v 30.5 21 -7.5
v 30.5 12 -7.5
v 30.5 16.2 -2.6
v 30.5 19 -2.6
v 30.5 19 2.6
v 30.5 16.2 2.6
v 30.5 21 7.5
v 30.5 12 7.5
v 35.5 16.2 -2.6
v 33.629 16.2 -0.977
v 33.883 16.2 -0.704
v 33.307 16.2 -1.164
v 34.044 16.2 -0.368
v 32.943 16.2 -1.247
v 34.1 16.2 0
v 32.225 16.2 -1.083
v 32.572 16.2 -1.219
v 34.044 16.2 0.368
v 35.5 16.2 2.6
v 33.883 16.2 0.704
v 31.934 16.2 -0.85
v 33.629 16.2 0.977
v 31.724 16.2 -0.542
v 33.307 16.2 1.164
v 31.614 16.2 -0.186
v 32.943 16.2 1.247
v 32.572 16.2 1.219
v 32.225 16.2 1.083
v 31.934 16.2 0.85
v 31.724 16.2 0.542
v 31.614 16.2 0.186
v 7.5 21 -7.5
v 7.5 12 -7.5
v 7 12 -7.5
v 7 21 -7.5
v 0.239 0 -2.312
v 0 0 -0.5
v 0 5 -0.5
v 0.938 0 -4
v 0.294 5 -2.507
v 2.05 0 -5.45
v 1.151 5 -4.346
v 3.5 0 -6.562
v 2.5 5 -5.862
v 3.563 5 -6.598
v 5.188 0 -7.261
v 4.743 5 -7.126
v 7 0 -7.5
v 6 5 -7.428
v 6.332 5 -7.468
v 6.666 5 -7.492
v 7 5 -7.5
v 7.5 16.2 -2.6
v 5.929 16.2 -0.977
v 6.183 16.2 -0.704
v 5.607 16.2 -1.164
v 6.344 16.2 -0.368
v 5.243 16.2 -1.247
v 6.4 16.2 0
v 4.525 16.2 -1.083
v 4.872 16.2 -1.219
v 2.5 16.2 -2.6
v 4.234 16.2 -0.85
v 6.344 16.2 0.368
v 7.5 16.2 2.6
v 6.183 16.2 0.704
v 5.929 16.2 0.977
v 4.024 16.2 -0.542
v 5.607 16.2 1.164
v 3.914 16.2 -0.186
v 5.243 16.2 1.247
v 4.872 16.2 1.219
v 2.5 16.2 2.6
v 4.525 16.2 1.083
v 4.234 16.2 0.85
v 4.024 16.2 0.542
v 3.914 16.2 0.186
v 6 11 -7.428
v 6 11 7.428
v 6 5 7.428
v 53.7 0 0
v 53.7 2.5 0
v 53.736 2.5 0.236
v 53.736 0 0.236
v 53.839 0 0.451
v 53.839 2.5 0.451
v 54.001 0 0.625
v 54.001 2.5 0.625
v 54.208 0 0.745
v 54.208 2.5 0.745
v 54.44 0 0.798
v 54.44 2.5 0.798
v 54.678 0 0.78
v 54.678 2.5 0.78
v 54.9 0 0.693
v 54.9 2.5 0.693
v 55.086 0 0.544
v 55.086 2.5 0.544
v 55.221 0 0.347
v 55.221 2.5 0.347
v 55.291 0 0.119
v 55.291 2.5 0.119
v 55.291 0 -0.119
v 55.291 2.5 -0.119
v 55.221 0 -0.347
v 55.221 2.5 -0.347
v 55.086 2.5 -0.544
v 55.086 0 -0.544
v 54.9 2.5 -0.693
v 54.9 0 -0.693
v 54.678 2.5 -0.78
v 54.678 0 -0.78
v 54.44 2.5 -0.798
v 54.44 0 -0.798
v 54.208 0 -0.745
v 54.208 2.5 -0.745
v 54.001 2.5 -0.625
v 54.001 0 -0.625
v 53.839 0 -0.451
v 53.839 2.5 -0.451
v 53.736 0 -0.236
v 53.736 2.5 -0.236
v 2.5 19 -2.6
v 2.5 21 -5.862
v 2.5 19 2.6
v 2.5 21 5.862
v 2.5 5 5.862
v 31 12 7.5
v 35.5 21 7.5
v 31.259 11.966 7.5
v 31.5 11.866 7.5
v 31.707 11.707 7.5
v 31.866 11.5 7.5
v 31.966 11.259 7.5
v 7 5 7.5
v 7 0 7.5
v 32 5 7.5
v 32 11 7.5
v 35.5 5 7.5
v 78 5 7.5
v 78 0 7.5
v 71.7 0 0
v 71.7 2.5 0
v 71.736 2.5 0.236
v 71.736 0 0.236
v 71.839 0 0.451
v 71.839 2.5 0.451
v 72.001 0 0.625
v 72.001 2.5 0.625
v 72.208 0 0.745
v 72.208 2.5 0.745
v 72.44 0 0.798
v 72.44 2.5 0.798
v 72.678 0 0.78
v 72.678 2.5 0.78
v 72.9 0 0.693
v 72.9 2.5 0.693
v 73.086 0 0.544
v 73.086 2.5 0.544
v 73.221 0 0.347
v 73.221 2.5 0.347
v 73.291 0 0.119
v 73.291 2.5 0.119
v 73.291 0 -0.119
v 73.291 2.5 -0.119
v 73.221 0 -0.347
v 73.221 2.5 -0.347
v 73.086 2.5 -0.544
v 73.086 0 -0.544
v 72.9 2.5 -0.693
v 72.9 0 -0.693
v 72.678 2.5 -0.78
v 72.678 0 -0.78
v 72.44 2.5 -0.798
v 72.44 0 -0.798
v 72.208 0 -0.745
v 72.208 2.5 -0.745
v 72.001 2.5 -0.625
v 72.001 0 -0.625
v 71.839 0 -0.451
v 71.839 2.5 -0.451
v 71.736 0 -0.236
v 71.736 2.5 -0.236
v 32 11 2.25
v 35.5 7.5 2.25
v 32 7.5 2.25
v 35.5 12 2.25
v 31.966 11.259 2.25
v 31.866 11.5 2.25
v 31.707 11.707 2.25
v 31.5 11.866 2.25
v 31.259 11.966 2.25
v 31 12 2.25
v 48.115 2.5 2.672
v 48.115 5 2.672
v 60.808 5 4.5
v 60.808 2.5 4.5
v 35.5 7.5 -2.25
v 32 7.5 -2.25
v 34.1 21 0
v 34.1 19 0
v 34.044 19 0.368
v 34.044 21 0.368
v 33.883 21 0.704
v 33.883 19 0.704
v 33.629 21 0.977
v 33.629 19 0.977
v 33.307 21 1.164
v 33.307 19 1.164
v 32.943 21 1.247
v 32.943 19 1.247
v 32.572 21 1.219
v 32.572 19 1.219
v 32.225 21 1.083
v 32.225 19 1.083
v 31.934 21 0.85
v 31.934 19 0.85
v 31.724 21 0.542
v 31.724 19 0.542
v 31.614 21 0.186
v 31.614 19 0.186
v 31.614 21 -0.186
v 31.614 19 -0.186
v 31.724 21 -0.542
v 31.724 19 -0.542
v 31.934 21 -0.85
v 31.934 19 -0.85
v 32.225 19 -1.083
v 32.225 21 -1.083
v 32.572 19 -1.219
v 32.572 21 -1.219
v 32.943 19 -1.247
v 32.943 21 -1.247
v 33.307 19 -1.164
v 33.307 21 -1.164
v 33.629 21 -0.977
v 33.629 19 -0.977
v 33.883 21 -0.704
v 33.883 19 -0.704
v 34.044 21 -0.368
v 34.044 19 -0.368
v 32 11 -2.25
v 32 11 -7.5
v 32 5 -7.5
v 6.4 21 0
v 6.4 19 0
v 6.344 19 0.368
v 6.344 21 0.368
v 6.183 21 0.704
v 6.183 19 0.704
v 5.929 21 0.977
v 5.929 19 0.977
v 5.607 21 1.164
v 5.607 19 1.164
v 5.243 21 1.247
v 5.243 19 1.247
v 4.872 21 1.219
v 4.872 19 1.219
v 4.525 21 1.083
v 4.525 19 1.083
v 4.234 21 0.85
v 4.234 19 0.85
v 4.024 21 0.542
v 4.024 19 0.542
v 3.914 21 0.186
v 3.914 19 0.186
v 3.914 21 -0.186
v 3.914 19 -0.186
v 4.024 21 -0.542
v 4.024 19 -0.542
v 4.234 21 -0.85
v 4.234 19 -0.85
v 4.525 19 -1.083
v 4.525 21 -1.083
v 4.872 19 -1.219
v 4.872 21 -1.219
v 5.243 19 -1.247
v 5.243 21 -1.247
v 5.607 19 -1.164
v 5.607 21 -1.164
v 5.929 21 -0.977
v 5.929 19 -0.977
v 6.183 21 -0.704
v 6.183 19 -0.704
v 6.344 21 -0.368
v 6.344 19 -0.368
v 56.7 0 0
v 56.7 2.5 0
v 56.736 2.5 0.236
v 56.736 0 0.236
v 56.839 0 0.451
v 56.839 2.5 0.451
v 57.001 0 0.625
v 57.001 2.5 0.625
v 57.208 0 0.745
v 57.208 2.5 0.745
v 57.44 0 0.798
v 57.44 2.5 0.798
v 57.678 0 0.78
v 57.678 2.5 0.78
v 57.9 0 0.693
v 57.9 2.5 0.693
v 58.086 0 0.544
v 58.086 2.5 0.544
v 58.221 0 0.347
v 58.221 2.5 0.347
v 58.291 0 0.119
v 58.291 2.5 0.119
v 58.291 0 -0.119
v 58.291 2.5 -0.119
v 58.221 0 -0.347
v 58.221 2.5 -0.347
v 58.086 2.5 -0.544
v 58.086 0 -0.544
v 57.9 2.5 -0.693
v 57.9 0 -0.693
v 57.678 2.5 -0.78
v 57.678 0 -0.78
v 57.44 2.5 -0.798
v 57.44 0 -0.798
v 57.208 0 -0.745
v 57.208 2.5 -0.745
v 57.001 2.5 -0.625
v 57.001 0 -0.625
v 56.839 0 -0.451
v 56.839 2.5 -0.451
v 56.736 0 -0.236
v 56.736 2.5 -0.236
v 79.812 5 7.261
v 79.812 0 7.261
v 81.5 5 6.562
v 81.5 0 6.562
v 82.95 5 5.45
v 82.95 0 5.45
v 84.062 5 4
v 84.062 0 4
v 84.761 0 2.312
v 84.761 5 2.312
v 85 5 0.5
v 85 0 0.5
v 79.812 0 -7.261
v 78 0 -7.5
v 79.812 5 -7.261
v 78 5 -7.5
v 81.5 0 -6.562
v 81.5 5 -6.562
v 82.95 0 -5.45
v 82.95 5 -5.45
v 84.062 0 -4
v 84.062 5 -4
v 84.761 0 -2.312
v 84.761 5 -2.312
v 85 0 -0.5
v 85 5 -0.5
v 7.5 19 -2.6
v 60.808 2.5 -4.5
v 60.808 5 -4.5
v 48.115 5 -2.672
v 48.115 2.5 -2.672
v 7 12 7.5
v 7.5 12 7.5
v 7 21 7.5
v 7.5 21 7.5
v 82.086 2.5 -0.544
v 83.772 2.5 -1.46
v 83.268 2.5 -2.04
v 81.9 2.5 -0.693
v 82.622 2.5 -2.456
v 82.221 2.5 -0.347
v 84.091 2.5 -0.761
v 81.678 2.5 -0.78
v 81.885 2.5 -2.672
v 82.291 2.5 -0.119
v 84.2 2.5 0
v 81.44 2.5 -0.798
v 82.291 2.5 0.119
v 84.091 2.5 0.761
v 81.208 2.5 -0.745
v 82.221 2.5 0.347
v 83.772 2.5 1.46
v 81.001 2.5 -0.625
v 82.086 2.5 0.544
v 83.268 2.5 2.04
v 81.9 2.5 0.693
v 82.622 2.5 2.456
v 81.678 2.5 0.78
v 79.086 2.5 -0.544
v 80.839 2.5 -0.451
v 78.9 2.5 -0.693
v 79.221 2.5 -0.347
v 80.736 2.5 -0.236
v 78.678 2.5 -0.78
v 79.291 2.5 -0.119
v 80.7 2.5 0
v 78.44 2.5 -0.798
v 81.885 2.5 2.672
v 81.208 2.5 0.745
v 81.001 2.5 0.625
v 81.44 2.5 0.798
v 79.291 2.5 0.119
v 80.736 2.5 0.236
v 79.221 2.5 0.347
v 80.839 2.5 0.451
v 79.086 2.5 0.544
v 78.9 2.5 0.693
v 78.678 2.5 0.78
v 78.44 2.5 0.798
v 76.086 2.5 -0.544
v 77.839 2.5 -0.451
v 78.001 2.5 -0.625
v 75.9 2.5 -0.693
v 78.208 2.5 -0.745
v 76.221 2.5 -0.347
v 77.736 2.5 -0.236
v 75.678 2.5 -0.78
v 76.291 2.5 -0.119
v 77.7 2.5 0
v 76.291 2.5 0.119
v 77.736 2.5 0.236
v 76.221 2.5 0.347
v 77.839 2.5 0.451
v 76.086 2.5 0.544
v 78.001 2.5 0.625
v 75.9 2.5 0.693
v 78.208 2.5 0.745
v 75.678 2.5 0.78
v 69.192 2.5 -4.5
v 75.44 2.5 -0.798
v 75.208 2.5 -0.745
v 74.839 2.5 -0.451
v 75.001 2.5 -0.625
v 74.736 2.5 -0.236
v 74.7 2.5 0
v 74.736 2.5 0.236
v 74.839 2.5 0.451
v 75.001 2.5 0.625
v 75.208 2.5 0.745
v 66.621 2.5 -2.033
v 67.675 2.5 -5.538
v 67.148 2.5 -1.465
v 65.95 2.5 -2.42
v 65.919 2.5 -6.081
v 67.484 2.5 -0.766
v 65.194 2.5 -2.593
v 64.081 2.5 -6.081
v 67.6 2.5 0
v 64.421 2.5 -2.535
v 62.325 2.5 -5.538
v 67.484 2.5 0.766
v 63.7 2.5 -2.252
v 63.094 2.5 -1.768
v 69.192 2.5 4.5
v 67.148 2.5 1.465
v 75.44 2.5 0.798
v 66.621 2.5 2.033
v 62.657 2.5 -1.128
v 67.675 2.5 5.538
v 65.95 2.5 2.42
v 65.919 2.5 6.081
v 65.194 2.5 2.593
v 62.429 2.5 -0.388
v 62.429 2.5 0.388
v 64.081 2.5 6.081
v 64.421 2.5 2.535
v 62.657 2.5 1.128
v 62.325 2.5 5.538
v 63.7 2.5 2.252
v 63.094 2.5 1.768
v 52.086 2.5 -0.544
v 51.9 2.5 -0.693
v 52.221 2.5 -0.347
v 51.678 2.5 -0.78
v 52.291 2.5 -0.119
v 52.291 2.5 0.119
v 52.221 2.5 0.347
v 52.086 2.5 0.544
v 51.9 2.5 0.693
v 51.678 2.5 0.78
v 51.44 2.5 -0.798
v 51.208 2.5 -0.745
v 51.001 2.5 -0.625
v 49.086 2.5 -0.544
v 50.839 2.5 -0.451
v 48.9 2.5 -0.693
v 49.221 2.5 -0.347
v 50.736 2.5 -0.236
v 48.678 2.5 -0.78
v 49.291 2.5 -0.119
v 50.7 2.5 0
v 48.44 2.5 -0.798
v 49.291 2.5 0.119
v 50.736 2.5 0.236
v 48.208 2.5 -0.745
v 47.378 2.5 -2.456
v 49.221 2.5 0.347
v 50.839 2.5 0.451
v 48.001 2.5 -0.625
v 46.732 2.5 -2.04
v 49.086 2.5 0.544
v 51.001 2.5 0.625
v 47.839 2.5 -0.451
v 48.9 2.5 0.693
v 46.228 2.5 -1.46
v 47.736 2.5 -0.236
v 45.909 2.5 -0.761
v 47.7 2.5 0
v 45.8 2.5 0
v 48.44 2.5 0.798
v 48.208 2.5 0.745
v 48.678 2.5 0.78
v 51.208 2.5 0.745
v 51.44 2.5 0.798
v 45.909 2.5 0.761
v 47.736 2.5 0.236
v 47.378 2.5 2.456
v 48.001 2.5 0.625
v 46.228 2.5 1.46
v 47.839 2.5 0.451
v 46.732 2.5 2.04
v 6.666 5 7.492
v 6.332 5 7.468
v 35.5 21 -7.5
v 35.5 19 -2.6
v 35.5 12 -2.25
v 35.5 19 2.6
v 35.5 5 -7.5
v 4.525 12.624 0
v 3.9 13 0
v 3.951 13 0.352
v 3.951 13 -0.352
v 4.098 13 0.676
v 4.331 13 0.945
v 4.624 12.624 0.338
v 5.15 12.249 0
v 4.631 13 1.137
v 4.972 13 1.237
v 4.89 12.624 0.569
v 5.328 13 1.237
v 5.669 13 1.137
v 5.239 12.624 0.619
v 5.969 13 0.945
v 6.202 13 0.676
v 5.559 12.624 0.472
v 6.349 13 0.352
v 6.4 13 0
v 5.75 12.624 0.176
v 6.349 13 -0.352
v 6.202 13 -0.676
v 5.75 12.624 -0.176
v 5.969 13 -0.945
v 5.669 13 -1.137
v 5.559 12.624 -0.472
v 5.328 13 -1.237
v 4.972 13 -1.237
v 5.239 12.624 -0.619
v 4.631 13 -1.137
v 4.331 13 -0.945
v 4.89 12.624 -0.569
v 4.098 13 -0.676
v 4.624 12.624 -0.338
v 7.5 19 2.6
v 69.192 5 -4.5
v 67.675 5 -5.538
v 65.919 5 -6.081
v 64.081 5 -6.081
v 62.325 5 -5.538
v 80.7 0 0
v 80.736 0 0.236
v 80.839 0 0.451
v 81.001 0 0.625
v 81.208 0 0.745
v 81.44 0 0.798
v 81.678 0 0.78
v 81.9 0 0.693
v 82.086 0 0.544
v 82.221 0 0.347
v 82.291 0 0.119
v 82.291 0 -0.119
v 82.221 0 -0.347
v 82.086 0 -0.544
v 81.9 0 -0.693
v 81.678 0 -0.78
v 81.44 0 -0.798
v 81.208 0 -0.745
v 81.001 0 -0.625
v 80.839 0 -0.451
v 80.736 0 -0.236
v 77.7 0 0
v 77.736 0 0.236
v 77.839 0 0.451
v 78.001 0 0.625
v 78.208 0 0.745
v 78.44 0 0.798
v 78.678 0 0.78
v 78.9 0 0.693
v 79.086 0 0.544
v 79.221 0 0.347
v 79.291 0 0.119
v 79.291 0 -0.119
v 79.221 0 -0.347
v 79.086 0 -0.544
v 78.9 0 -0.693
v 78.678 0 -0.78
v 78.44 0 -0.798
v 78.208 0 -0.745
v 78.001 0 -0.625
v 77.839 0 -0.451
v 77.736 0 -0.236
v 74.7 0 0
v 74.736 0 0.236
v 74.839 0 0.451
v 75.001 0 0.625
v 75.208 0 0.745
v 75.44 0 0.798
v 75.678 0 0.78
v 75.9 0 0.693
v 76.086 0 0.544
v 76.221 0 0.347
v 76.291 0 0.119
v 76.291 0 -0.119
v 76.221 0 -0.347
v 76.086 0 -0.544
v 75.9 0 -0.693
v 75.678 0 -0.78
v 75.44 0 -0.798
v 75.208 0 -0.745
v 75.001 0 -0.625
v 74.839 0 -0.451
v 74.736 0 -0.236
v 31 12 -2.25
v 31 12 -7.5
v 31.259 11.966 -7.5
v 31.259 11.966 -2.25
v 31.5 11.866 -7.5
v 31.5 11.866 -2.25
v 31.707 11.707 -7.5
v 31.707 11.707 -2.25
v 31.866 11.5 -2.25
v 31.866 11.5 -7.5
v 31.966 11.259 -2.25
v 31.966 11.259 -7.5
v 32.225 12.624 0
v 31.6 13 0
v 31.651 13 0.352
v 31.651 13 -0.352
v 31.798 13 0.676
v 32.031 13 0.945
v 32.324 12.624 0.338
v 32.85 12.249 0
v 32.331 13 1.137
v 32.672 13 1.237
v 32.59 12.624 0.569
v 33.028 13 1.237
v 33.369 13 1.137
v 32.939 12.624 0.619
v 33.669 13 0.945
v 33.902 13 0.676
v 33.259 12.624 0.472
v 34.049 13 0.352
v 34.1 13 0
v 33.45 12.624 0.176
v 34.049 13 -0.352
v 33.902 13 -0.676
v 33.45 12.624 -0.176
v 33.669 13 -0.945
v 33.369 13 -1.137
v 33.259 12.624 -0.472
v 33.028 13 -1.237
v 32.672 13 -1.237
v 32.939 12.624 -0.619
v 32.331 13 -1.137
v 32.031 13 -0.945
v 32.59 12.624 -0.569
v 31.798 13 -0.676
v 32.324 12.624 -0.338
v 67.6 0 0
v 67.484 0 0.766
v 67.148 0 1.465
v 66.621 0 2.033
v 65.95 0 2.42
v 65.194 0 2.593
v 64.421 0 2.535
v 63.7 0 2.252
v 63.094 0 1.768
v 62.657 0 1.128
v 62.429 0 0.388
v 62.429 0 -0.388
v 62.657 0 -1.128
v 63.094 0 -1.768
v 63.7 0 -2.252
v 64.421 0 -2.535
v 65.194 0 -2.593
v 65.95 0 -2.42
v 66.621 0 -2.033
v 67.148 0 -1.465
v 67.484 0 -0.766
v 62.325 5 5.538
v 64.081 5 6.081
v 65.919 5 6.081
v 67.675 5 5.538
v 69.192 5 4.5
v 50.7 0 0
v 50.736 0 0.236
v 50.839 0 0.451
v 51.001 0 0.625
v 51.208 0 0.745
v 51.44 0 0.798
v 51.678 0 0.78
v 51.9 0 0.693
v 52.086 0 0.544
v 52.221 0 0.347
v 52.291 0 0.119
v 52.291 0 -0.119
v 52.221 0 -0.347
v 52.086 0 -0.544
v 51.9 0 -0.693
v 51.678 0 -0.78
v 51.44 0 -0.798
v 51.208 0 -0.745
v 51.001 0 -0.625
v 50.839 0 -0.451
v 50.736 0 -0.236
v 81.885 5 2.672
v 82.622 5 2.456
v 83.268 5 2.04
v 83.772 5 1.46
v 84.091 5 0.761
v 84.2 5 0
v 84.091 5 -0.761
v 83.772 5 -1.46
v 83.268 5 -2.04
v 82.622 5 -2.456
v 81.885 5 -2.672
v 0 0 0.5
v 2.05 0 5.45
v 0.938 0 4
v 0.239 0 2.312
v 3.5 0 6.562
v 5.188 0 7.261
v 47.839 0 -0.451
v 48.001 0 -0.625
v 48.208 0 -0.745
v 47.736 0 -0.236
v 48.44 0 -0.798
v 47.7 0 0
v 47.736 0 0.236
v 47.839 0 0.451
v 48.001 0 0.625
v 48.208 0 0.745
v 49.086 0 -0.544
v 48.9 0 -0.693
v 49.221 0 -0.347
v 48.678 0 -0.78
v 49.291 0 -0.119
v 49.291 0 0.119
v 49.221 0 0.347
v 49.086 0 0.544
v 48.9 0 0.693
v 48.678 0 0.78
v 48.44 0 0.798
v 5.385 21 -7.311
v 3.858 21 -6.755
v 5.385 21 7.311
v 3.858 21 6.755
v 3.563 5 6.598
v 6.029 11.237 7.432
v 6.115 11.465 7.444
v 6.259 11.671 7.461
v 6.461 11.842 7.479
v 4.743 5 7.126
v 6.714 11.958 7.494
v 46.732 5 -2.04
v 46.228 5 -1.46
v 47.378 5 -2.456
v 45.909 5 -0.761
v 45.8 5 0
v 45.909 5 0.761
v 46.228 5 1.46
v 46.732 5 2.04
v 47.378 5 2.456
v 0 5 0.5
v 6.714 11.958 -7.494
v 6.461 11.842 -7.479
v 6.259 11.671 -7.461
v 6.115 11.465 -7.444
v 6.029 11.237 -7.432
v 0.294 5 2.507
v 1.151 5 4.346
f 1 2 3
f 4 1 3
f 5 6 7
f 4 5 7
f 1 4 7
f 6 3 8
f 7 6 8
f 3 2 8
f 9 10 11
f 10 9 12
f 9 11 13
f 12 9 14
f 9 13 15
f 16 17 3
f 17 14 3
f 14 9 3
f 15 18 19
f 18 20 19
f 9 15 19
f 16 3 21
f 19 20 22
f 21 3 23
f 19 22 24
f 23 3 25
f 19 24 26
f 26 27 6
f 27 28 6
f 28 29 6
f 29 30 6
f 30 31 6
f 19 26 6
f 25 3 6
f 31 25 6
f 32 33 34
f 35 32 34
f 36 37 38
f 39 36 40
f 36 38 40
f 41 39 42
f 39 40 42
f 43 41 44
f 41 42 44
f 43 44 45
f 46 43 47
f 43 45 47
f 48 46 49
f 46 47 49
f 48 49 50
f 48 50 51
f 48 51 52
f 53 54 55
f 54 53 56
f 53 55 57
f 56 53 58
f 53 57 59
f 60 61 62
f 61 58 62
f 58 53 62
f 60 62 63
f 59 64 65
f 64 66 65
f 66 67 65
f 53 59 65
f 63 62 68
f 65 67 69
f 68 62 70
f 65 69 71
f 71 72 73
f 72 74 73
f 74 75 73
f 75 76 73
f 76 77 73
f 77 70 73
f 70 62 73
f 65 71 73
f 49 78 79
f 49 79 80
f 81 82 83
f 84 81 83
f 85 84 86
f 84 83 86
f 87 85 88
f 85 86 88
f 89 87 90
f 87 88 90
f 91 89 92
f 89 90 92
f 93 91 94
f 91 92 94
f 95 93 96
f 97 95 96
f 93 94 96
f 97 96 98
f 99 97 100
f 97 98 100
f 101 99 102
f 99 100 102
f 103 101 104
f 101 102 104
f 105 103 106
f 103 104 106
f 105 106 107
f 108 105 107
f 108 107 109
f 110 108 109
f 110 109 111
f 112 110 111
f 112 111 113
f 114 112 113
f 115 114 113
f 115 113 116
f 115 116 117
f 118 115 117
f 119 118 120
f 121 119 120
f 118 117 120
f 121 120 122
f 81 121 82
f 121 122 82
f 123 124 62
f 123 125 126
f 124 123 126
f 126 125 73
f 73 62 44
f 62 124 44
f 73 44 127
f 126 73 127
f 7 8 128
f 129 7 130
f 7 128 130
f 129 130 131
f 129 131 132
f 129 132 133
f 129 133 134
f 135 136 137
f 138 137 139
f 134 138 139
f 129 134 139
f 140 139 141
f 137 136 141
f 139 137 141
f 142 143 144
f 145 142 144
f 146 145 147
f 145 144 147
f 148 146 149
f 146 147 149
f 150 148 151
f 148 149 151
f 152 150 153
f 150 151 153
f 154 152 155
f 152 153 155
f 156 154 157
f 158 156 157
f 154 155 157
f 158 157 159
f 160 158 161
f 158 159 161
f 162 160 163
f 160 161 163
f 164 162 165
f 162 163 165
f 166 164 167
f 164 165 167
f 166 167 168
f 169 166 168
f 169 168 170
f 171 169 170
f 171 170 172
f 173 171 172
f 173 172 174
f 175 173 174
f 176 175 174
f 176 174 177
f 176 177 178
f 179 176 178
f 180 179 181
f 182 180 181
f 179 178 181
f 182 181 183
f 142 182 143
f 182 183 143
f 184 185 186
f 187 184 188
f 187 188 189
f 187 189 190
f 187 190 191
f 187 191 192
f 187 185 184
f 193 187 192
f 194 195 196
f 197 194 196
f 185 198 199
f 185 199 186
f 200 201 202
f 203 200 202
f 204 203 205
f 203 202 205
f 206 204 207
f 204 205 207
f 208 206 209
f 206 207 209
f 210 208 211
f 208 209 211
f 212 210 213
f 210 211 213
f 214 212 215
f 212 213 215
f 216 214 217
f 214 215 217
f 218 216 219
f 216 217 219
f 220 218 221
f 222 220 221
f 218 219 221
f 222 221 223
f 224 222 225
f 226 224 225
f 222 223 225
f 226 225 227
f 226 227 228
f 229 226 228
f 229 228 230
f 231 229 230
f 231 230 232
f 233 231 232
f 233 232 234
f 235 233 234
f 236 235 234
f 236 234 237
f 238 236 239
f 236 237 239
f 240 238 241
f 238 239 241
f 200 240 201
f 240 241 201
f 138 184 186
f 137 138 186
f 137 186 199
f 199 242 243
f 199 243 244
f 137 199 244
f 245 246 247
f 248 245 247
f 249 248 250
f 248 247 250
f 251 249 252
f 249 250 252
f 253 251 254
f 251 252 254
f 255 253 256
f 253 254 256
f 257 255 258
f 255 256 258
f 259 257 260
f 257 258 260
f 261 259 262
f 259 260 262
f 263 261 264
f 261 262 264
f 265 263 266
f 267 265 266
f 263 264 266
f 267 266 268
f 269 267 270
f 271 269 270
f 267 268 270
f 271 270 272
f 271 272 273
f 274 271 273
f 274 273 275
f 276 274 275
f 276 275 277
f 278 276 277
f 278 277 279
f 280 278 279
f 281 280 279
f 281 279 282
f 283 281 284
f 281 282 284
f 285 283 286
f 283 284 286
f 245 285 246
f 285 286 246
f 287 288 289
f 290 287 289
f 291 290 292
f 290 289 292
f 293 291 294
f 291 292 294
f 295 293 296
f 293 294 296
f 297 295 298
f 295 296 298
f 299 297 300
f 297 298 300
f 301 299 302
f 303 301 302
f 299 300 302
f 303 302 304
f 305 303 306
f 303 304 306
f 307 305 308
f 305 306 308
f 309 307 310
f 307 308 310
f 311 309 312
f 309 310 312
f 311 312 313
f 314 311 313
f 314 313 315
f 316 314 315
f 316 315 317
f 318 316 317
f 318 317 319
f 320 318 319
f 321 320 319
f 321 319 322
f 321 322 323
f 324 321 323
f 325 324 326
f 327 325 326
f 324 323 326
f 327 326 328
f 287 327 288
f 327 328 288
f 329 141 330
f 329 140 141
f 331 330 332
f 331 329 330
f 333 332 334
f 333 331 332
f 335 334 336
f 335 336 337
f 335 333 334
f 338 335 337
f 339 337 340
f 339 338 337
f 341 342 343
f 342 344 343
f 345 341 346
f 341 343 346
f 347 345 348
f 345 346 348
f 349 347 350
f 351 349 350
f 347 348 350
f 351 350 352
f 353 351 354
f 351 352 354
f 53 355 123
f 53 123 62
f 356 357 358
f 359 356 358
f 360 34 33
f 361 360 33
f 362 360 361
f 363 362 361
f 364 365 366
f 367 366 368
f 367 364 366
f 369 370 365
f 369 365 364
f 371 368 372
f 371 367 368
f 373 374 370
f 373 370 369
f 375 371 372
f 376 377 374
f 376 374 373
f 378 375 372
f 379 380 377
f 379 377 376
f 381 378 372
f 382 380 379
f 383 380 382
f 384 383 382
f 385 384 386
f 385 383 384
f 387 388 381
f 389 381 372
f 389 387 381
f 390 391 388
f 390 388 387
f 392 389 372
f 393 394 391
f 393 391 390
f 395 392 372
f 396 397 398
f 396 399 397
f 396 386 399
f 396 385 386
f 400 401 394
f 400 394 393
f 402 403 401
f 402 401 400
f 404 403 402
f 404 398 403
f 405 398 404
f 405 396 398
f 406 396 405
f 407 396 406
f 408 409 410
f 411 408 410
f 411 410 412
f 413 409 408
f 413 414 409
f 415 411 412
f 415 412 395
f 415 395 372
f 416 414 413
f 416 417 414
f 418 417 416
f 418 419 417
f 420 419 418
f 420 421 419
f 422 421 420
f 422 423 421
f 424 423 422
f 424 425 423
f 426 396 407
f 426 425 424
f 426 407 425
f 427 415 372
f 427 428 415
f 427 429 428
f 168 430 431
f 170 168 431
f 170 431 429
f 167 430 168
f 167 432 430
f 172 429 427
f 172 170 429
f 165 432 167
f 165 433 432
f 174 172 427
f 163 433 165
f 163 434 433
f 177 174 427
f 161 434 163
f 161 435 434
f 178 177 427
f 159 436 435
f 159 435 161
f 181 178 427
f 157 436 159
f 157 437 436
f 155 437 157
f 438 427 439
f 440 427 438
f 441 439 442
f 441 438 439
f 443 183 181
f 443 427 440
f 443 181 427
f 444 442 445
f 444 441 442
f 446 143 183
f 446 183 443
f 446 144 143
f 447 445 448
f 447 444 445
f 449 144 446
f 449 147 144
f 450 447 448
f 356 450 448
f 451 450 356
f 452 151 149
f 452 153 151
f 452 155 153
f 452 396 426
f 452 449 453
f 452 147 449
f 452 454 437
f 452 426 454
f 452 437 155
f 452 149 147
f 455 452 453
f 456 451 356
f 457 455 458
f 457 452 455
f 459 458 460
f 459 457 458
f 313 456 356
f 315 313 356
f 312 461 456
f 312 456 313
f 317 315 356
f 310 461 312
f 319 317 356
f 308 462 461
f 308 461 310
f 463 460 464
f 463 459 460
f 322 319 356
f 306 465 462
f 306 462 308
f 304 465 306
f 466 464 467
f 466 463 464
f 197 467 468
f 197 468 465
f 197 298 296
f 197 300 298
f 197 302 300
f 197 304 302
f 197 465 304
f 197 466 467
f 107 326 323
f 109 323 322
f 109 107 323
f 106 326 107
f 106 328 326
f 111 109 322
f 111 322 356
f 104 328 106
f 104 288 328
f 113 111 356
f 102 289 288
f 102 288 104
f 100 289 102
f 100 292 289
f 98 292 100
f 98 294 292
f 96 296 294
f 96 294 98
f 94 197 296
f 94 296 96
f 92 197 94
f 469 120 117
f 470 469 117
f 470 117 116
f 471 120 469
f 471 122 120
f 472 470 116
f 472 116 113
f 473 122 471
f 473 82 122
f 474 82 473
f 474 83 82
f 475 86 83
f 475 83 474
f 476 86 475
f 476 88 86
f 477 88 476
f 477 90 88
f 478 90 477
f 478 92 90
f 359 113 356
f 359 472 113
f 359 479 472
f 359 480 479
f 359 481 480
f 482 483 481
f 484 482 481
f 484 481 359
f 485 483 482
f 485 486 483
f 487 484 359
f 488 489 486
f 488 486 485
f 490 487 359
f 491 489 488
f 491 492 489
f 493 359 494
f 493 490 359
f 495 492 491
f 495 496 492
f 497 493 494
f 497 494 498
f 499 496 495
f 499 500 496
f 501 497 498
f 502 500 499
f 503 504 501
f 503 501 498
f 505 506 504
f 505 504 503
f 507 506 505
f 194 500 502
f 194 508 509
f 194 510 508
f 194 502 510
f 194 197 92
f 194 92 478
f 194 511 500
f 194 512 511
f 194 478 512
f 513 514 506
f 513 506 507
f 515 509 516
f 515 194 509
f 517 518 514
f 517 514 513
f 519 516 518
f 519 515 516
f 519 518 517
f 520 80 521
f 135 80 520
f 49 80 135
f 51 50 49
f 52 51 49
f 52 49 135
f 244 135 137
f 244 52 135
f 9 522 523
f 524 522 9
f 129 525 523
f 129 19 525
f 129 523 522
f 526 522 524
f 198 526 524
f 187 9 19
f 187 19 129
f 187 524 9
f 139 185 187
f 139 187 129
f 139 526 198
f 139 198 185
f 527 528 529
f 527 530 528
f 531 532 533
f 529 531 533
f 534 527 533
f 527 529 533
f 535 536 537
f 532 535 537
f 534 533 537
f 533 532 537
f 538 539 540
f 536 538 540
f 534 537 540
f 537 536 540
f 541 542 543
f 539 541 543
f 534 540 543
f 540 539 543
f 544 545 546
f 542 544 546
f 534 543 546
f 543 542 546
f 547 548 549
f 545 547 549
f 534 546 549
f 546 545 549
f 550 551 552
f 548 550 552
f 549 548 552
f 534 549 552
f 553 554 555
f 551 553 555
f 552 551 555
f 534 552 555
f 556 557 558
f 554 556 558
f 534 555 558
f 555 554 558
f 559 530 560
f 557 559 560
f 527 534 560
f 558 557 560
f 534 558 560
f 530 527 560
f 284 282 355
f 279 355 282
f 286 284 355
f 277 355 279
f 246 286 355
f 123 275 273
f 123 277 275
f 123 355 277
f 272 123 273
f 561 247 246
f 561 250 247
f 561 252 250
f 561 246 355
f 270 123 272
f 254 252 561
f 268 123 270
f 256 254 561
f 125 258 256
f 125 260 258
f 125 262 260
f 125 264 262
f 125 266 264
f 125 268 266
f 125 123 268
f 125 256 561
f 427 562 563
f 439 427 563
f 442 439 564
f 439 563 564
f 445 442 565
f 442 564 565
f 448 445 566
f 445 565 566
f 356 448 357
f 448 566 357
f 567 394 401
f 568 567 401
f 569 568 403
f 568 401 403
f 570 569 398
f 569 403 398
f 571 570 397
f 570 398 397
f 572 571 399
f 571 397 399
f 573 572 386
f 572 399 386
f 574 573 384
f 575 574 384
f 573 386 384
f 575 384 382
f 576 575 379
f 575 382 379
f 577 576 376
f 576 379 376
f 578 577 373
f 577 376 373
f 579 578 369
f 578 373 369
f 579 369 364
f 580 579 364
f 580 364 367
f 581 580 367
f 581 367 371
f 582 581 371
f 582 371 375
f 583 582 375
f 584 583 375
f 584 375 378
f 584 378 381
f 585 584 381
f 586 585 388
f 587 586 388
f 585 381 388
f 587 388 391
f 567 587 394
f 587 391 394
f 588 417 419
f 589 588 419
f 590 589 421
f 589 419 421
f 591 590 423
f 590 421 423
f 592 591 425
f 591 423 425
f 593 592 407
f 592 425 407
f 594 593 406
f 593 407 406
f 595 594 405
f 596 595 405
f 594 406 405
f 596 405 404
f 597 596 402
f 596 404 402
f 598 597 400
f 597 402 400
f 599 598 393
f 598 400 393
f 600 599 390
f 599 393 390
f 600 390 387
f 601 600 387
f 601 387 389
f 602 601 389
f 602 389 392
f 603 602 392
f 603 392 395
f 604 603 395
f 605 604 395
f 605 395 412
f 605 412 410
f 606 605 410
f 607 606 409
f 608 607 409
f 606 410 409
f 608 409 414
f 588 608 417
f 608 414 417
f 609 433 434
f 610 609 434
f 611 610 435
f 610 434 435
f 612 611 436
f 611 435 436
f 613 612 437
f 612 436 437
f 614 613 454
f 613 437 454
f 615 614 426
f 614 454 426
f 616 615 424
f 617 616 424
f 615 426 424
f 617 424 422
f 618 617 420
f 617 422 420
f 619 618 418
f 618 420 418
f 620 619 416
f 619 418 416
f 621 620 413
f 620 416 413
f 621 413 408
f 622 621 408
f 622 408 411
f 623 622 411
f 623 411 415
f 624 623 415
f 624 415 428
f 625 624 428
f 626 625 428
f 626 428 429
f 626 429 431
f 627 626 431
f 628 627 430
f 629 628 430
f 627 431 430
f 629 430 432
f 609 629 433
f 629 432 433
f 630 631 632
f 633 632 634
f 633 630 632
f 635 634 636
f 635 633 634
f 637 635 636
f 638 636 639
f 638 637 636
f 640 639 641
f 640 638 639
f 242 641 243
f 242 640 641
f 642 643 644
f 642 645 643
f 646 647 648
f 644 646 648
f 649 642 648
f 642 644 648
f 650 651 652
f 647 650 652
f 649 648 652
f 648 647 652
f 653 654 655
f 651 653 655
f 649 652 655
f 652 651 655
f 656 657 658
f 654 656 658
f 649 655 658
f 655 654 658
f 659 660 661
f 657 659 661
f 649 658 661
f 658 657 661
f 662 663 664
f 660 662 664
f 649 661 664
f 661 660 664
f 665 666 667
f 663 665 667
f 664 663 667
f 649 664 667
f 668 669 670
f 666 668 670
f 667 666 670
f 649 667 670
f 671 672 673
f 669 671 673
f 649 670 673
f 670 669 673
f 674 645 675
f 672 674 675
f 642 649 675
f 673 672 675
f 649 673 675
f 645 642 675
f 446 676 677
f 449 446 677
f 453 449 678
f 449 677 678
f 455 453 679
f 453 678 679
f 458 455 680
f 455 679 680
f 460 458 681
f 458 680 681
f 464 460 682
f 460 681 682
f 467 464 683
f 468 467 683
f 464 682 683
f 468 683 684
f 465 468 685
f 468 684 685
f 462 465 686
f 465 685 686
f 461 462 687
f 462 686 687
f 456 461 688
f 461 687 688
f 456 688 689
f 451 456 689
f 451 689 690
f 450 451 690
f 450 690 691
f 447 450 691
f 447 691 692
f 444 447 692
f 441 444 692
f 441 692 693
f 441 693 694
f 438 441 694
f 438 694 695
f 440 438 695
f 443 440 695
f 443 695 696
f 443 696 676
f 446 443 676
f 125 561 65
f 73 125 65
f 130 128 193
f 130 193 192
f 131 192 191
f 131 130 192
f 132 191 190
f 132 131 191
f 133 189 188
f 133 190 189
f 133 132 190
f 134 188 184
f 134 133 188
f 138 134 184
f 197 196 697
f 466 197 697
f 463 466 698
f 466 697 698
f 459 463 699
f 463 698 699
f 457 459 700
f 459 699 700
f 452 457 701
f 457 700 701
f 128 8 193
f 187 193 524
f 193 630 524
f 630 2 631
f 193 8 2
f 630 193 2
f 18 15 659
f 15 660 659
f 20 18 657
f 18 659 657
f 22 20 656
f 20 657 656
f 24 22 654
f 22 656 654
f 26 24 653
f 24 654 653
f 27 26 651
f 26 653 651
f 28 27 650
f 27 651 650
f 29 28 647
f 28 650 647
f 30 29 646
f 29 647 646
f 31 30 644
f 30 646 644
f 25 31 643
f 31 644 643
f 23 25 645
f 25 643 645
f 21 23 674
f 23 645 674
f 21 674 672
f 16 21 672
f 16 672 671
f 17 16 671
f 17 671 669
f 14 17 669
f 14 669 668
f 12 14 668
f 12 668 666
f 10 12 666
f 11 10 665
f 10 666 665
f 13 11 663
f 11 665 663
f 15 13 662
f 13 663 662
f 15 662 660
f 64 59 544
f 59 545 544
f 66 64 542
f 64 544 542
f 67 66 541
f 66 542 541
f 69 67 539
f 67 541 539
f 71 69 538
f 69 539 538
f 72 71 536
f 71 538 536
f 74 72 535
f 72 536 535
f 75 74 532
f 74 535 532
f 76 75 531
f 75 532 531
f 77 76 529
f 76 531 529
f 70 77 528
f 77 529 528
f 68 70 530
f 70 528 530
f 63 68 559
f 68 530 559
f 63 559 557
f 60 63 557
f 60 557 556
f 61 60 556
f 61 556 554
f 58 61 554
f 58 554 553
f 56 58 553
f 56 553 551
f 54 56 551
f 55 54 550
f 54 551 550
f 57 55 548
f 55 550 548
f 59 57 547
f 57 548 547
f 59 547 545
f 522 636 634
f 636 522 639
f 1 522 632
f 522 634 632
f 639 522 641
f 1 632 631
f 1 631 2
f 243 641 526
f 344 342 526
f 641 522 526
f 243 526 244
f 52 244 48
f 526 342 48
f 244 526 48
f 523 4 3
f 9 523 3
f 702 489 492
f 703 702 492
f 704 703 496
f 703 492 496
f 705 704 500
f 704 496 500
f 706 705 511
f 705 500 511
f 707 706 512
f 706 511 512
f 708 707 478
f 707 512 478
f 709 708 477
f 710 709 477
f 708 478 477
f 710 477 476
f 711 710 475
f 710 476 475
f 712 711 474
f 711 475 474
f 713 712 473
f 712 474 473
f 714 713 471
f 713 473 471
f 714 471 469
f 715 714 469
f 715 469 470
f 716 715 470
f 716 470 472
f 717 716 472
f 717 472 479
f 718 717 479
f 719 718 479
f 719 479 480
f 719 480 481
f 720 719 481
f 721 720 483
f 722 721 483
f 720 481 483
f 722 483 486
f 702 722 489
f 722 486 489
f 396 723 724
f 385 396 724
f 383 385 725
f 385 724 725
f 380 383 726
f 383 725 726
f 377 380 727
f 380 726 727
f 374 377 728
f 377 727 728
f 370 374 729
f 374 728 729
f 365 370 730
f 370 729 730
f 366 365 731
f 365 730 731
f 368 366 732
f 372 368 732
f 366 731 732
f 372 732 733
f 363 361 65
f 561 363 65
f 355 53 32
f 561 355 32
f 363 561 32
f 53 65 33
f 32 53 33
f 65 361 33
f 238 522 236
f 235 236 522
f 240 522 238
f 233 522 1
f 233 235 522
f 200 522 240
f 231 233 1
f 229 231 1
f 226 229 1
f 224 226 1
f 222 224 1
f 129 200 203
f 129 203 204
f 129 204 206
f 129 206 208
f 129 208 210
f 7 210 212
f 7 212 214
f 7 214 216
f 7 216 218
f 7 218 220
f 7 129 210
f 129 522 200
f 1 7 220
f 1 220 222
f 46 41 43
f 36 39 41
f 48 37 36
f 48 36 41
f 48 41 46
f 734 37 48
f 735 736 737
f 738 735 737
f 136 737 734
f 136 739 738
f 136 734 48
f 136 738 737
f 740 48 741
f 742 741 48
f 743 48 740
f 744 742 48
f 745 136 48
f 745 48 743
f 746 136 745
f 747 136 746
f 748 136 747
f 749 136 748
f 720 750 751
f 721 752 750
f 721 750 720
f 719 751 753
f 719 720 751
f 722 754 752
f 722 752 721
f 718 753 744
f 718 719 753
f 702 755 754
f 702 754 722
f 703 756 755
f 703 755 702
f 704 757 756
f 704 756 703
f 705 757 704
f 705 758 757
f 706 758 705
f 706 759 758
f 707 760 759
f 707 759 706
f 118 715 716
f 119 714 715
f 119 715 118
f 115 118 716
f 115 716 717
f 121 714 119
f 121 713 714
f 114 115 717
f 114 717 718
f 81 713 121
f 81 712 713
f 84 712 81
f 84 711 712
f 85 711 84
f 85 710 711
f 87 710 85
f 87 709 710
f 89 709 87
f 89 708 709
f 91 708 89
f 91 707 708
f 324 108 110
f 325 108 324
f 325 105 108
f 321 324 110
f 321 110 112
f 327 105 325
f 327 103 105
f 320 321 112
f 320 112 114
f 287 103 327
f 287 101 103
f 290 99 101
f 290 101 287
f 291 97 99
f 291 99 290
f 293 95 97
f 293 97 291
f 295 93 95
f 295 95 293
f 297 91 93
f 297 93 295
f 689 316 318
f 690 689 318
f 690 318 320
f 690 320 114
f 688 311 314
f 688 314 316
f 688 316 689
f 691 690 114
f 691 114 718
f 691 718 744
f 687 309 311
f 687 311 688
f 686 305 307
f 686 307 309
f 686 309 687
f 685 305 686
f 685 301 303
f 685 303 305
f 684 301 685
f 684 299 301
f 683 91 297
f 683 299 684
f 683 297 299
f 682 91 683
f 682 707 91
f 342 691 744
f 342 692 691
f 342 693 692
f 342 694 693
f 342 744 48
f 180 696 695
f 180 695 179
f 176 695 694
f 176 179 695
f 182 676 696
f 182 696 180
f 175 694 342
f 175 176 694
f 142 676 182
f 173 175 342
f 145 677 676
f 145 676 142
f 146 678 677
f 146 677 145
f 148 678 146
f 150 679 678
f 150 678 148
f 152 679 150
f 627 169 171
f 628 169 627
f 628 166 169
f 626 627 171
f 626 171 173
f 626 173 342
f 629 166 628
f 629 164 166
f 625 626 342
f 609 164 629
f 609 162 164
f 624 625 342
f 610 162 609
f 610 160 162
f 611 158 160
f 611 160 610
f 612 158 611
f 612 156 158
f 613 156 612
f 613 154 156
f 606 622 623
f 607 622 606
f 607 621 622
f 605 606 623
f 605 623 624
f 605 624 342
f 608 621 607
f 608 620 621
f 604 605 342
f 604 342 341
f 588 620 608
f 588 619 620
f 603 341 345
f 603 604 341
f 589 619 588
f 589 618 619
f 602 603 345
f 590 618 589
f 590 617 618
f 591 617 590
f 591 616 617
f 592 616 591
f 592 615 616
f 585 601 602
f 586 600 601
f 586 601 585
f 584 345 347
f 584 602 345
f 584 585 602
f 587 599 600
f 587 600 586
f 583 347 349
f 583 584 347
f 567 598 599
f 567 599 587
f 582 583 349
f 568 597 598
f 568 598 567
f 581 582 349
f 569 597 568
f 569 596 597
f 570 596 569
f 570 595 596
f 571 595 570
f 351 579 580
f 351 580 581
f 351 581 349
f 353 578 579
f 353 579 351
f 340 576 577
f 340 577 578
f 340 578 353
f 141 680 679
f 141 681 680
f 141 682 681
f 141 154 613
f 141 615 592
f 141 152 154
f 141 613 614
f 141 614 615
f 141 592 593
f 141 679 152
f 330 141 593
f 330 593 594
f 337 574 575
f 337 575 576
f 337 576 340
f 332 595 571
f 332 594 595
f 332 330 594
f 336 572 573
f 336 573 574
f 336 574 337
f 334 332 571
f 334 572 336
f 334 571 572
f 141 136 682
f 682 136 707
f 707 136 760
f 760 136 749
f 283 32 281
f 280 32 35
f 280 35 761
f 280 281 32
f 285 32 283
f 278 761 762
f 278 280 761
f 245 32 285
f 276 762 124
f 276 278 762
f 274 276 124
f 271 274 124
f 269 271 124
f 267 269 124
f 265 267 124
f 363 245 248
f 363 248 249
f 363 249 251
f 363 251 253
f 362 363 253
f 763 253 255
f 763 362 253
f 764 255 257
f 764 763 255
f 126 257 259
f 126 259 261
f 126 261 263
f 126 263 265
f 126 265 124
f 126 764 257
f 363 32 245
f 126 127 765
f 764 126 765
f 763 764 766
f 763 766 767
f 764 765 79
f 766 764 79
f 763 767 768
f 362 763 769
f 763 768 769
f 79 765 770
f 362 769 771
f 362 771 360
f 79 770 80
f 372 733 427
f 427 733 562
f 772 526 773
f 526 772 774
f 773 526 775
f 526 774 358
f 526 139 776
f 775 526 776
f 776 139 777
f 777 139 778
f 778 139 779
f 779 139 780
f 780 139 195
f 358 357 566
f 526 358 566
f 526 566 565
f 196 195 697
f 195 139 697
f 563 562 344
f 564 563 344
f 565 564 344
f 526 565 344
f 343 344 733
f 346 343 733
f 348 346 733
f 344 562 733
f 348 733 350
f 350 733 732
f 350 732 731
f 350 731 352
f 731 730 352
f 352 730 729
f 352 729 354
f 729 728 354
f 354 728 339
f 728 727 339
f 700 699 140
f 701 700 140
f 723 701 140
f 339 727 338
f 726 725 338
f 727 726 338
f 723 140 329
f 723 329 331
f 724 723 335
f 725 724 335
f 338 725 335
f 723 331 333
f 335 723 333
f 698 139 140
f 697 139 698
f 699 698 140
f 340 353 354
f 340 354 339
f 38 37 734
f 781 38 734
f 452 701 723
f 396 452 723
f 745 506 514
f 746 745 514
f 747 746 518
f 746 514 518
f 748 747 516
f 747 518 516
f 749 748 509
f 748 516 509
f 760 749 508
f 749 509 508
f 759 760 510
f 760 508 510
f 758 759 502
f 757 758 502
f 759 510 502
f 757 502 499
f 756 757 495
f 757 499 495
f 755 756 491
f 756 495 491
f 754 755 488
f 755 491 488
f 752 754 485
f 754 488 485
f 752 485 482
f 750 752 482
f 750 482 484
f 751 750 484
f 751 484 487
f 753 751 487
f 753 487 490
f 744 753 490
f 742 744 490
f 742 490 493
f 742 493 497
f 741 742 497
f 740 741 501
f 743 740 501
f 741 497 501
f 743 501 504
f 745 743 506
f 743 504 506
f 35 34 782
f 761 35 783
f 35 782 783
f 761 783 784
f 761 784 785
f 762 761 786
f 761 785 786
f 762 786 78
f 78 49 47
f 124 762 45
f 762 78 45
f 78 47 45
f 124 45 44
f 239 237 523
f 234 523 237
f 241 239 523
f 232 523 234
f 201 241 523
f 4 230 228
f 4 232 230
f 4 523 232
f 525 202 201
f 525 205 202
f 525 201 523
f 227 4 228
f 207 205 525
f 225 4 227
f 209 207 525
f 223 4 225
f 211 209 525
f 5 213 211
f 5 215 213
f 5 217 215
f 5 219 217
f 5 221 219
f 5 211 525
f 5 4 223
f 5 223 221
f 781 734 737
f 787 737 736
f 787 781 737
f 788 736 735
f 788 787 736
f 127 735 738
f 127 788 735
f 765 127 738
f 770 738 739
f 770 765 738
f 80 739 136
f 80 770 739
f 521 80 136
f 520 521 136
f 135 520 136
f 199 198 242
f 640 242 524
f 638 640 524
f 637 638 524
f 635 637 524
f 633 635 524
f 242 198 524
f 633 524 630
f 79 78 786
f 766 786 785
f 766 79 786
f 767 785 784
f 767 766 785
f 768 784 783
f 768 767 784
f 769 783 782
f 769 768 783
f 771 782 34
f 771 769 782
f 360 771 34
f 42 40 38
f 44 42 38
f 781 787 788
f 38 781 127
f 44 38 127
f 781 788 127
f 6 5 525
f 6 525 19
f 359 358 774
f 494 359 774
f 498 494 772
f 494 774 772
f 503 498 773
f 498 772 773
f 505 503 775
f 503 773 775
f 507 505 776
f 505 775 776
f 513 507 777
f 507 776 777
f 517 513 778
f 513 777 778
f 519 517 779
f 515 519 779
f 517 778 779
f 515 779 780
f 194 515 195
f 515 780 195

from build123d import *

# Parameters (mm, degrees)
F0_W      = 85
F0_H      = 15
F0_R      = 2.6
F1_DEPTH  = 5
F3_DEPTH  = 2.5
F4_R      = 7
F5_R      = 0.8
F6_DEPTH  = 2.5
F7_W      = 5
F7_H      = 15
F8_DEPTH  = 16
F10_D     = 2.5
F10_DEPTH = 8
F10_TIP   = 0.7510757738
F11_W     = 2.8
F11_H     = 5.2
F12_DEPTH = 33
F13_W     = 26
F13_H     = 7
F14_DEPTH = 15
F15_R     = 1
F16_W     = 4.5
F16_H     = 4.5
F17_DEPTH = 5


with BuildPart() as f1:
    # F0 (on Front) → F1 (new body)
    with BuildSketch(Plane.XZ):
        with Locations((42.5, 0)):
            Rectangle(F0_W, F0_H)
        with Locations((65, 0)):
            Circle(F0_R, mode=Mode.SUBTRACT)
    extrude(amount=-F1_DEPTH)

    # F2 (on face) → F3 (cut)
    with BuildSketch(Plane(origin=(0, 5, 0), x_dir=(-1, 0, 0), z_dir=(0, 1, 0))):
        with BuildLine():
            Line((-81.8847875997, -2.6724405518), (-69.1919565837, -4.5))
            ThreePointArc((-69.1919565837, -4.5), (-65, -6.15), (-60.8080434163, -4.5))
            Line((-60.8080434163, -4.5), (-48.1152124003, -2.6724405518))
            ThreePointArc((-48.1152124003, -2.6724405518), (-45.8, 0), (-48.1152124003, 2.6724405518))
            Line((-48.1152124003, 2.6724405518), (-60.8080434163, 4.5))
            ThreePointArc((-60.8080434163, 4.5), (-65, 6.15), (-69.1919565837, 4.5))
            Line((-69.1919565837, 4.5), (-81.8847875997, 2.6724405518))
            ThreePointArc((-81.8847875997, 2.6724405518), (-84.2, 0), (-81.8847875997, -2.6724405518))
        make_face()
    extrude(amount=-F3_DEPTH, mode=Mode.SUBTRACT)

    # F4
    f4_edges = [f1.edges().sort_by_distance(p)[0] for p in [
        (85, 2.5, 7.5),
        (85, 2.5, -7.5),
        (0, 2.5, 7.5),
        (0, 2.5, -7.5),
    ]]
    fillet(f4_edges, radius=F4_R)

    # F5 (on face) → F6 (cut, through all)
    with BuildSketch(Plane(origin=(0, 2.5, 0), x_dir=(-1, 0, 0), z_dir=(0, 1, 0))):
        with Locations((-81.5, 0)):
            Circle(F5_R)
        with Locations((-78.5, 0)):
            Circle(F5_R)
        with Locations((-75.5, 0)):
            Circle(F5_R)
        with Locations((-72.5, 0)):
            Circle(F5_R)
        with Locations((-57.5, 0)):
            Circle(F5_R)
        with Locations((-54.5, 0)):
            Circle(F5_R)
        with Locations((-51.5, 0)):
            Circle(F5_R)
        with Locations((-48.5, 0)):
            Circle(F5_R)
    extrude(amount=-F6_DEPTH, mode=Mode.SUBTRACT)

    # F7 (on face) → F8 (join)
    with BuildSketch(Plane(origin=(0, 5, 0), x_dir=(-1, 0, 0), z_dir=(0, 1, 0))):
        with Locations((-33, 0)):
            Rectangle(F7_W, F7_H)
        with BuildLine():
            Line((-7, 7.5), (-7.5, 7.5))
            Line((-7.5, 7.5), (-7.5, -7.5))
            Line((-7.5, -7.5), (-7, -7.5))
            ThreePointArc((-7, -7.5), (-4.6055604551, -7.0777396776), (-2.5, -5.8619026474))
            Line((-2.5, -5.8619026474), (-2.5, 5.8619026474))
            ThreePointArc((-2.5, 5.8619026474), (-4.6055604551, 7.0777396776), (-7, 7.5))
        make_face()
    extrude(amount=F8_DEPTH)

    # F10
    with Locations(Plane(origin=(0, 21, 0), x_dir=(-1, 0, 0), z_dir=(0, 1, 0))):
        with Locations((-32.85, 0), (-5.15, 0)):
            Hole(F10_D / 2, depth=F10_DEPTH)
            with Locations((0, 0, -(F10_DEPTH + F10_TIP / 2))):  # 118° drill point
                Cone(0, F10_D / 2, F10_TIP, mode=Mode.SUBTRACT)

    # F11 (on face) → F12 (cut, through all)
    with BuildSketch(Plane(origin=(2.5, 0, 0), x_dir=(0, -1, 0), z_dir=(-1, 0, 0))):
        with Locations((-17.6, 0)):
            Rectangle(F11_W, F11_H)
    extrude(amount=-F12_DEPTH, mode=Mode.SUBTRACT)

    # F13 (on face) → F14 (cut, through all)
    with BuildSketch(Plane(origin=(0, 0, -7.5), x_dir=(1, 0, 0), z_dir=(0, 0, -1))):
        with Locations((19, -8.5)):
            Rectangle(F13_W, F13_H)
    extrude(amount=-F14_DEPTH, mode=Mode.SUBTRACT)

    # F15
    f15_edges = [f1.edges().sort_by_distance(p)[0] for p in [
        (32, 12, 0),
        (6, 12, 0),
    ]]
    fillet(f15_edges, radius=F15_R)

    # F16 (on face) → F17 (cut, through all)
    with BuildSketch(Plane.YZ.offset(35.5)):
        with Locations((9.75, 0)):
            Rectangle(F16_W, F16_H)
    extrude(amount=-F17_DEPTH, mode=Mode.SUBTRACT)


solid = f1.part
